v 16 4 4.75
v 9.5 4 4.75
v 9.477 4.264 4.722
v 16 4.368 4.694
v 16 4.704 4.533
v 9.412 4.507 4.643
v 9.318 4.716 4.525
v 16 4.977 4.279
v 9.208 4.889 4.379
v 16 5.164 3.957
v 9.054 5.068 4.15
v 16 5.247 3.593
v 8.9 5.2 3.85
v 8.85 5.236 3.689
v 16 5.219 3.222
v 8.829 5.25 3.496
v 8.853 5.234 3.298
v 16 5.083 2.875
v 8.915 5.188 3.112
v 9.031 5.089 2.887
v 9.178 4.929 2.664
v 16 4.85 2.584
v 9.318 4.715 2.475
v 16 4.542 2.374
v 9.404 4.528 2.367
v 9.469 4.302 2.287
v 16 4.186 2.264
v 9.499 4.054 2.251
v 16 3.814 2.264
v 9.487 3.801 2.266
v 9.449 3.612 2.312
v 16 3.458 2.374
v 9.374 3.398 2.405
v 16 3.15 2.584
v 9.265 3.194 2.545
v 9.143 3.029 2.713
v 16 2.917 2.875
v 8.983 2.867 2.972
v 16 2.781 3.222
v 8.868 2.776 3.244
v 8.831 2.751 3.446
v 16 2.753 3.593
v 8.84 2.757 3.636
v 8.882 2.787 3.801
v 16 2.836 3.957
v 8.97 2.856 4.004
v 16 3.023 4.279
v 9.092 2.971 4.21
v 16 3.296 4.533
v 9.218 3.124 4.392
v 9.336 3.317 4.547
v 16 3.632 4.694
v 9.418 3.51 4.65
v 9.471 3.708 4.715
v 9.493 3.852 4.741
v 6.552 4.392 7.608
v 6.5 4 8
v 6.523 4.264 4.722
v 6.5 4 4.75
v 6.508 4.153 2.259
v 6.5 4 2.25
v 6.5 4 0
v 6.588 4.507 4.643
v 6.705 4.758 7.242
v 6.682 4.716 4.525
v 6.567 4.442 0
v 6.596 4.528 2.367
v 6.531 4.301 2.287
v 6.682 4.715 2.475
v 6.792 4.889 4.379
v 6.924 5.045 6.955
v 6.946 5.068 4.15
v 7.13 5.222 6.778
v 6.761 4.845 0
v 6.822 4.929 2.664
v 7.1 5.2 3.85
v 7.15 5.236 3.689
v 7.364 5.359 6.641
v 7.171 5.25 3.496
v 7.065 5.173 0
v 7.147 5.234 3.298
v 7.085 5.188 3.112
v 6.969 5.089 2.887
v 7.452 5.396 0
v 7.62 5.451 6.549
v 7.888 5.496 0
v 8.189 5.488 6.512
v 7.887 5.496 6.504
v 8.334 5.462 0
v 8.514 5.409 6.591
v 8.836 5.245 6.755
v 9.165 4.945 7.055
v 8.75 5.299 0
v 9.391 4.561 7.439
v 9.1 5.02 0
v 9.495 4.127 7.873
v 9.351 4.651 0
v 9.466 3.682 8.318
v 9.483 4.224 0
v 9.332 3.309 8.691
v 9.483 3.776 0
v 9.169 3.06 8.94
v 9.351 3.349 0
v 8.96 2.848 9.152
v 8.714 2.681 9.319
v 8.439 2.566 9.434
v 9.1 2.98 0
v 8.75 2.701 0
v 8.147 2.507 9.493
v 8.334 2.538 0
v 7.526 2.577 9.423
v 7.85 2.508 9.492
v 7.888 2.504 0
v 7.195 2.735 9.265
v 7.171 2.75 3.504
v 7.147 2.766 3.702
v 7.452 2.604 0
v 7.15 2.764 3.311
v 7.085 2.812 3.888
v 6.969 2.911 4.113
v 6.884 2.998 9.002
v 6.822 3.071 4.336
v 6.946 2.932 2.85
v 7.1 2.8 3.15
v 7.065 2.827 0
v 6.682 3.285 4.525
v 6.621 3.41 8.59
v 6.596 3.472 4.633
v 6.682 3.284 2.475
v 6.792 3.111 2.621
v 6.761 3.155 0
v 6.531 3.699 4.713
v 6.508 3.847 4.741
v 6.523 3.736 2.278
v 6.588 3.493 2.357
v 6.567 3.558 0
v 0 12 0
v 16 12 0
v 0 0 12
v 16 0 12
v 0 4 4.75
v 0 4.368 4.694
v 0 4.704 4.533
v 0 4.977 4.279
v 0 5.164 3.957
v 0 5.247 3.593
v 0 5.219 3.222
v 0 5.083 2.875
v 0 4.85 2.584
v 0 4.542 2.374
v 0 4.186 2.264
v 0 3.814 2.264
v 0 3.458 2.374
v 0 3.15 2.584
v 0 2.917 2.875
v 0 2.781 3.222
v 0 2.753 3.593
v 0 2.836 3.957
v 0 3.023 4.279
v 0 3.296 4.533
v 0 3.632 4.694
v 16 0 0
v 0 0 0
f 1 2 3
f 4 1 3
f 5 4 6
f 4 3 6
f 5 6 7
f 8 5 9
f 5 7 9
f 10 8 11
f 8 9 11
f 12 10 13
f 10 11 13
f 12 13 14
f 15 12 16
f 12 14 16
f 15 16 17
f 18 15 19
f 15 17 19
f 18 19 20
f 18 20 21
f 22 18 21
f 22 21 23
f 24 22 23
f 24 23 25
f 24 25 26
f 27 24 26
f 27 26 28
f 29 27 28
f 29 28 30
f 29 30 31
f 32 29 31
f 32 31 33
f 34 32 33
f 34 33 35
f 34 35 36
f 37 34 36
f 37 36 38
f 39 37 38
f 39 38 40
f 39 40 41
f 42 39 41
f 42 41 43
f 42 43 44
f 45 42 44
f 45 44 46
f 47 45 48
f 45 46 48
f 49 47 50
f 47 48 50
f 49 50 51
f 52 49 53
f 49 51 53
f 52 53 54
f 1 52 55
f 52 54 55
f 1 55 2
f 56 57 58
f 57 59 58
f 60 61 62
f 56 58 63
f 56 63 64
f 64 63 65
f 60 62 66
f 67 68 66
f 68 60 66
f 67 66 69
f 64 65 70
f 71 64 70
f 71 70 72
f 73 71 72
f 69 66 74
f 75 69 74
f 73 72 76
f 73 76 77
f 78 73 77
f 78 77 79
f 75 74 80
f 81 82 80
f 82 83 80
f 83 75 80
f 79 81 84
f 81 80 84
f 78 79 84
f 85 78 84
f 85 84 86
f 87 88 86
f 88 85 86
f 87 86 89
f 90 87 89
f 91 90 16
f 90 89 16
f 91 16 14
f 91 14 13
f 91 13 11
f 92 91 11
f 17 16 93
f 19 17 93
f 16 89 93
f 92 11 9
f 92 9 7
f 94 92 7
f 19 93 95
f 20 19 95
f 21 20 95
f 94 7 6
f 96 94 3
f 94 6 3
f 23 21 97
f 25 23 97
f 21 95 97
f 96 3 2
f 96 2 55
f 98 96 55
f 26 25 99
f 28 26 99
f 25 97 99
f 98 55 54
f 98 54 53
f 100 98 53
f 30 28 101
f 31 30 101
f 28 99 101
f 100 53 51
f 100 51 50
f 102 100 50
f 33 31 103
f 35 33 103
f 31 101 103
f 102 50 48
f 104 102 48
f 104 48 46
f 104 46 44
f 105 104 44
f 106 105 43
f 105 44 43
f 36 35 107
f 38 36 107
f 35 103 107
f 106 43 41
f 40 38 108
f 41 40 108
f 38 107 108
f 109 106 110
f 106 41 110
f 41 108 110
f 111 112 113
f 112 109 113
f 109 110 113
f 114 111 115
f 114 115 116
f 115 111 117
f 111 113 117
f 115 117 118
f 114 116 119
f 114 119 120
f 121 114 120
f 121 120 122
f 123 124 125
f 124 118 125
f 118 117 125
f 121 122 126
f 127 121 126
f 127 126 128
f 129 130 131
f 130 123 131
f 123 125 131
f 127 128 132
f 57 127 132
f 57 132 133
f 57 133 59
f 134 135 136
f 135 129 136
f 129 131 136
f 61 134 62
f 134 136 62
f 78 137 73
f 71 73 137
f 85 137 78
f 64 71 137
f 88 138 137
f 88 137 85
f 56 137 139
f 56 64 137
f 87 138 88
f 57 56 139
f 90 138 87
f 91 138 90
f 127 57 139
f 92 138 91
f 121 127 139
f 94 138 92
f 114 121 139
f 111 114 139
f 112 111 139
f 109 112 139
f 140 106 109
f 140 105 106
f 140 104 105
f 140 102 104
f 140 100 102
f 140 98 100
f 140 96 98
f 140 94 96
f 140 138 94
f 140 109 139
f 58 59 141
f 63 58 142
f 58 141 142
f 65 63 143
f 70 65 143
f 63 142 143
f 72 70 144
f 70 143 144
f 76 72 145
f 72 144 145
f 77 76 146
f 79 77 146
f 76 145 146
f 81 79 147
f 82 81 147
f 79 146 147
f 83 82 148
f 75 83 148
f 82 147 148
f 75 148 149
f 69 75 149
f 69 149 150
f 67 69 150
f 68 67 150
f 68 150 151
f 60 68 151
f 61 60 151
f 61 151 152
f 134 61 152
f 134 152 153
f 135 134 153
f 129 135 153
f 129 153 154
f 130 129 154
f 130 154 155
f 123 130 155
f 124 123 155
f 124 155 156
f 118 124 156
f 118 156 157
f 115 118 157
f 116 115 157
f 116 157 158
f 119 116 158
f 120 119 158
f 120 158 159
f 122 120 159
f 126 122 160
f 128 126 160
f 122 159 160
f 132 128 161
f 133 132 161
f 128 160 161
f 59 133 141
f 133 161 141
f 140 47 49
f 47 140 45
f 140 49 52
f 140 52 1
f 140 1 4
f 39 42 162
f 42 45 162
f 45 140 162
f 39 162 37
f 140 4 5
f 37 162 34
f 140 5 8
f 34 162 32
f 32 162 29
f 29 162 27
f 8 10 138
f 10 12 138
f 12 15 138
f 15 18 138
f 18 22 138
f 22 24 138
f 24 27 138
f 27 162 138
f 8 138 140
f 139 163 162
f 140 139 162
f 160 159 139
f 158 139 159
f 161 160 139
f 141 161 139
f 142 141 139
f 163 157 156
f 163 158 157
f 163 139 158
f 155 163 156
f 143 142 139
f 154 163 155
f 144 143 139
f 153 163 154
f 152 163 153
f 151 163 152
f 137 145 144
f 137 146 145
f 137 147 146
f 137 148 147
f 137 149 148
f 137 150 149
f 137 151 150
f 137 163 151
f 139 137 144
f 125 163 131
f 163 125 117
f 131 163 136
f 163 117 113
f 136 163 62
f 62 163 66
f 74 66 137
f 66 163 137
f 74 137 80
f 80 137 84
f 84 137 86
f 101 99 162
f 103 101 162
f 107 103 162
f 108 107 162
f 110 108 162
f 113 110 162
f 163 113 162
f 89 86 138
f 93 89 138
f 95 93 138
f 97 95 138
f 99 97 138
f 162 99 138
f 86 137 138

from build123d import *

# Parameters (mm, degrees)
ESQUISSE1_W             = 16
ESQUISSE1_H             = 12
EXTRUSION1_DEPTH        = 14
CHANFREIN1_SIZE         = 14
ESQUISSE3_R             = 1.5
ENL_V_MAT_EXTRU_2_DEPTH = 24.323807579
TROU_TARAUD_M3X0_51_D   = 2.5


with BuildPart() as part:
    # Esquisse1 → Extrusion1 (new body)
    with BuildSketch(Plane.XY):
        with Locations((8, 6)):
            Rectangle(ESQUISSE1_W, ESQUISSE1_H)
    extrude(amount=EXTRUSION1_DEPTH)

    # Chanfrein1
    # the kernel refuses this chamfer: 14 mm, written as the material it takes off along each edge
    with BuildSketch(Plane(origin=(52.003561832, 12, 14), x_dir=(0, 0.027495876610586365, -0.9996219169112968), z_dir=(-1, 0, 0))) as chanfrein1_piece_1:
        Polygon((CHANFREIN1_SIZE * 0.999621916911, CHANFREIN1_SIZE * 0.0274958766106), (-CHANFREIN1_SIZE * 0.0274958766106, CHANFREIN1_SIZE * 0.999621916911), (0, 0), align=None)
    extrude(amount=88.007123663, mode=Mode.SUBTRACT)

    # Esquisse3 → Enlèv. mat.-Extru.2 (cut, through all)
    with BuildSketch(Plane(origin=(0, 0, 0), x_dir=(-1, 0, 0), z_dir=(0, 0, -1))):
        with Locations((-8, 4)):
            Circle(ESQUISSE3_R)
    extrude(amount=-ENL_V_MAT_EXTRU_2_DEPTH, mode=Mode.SUBTRACT)

    # Trou taraudé M3x0.51 (through all)
    with Locations(Plane(origin=(16, 0, 0), x_dir=(0, 0, -1), z_dir=(1, 0, 0))):
        with Locations((-3.5, 4)):
            Hole(TROU_TARAUD_M3X0_51_D / 2)


solid = part.part
